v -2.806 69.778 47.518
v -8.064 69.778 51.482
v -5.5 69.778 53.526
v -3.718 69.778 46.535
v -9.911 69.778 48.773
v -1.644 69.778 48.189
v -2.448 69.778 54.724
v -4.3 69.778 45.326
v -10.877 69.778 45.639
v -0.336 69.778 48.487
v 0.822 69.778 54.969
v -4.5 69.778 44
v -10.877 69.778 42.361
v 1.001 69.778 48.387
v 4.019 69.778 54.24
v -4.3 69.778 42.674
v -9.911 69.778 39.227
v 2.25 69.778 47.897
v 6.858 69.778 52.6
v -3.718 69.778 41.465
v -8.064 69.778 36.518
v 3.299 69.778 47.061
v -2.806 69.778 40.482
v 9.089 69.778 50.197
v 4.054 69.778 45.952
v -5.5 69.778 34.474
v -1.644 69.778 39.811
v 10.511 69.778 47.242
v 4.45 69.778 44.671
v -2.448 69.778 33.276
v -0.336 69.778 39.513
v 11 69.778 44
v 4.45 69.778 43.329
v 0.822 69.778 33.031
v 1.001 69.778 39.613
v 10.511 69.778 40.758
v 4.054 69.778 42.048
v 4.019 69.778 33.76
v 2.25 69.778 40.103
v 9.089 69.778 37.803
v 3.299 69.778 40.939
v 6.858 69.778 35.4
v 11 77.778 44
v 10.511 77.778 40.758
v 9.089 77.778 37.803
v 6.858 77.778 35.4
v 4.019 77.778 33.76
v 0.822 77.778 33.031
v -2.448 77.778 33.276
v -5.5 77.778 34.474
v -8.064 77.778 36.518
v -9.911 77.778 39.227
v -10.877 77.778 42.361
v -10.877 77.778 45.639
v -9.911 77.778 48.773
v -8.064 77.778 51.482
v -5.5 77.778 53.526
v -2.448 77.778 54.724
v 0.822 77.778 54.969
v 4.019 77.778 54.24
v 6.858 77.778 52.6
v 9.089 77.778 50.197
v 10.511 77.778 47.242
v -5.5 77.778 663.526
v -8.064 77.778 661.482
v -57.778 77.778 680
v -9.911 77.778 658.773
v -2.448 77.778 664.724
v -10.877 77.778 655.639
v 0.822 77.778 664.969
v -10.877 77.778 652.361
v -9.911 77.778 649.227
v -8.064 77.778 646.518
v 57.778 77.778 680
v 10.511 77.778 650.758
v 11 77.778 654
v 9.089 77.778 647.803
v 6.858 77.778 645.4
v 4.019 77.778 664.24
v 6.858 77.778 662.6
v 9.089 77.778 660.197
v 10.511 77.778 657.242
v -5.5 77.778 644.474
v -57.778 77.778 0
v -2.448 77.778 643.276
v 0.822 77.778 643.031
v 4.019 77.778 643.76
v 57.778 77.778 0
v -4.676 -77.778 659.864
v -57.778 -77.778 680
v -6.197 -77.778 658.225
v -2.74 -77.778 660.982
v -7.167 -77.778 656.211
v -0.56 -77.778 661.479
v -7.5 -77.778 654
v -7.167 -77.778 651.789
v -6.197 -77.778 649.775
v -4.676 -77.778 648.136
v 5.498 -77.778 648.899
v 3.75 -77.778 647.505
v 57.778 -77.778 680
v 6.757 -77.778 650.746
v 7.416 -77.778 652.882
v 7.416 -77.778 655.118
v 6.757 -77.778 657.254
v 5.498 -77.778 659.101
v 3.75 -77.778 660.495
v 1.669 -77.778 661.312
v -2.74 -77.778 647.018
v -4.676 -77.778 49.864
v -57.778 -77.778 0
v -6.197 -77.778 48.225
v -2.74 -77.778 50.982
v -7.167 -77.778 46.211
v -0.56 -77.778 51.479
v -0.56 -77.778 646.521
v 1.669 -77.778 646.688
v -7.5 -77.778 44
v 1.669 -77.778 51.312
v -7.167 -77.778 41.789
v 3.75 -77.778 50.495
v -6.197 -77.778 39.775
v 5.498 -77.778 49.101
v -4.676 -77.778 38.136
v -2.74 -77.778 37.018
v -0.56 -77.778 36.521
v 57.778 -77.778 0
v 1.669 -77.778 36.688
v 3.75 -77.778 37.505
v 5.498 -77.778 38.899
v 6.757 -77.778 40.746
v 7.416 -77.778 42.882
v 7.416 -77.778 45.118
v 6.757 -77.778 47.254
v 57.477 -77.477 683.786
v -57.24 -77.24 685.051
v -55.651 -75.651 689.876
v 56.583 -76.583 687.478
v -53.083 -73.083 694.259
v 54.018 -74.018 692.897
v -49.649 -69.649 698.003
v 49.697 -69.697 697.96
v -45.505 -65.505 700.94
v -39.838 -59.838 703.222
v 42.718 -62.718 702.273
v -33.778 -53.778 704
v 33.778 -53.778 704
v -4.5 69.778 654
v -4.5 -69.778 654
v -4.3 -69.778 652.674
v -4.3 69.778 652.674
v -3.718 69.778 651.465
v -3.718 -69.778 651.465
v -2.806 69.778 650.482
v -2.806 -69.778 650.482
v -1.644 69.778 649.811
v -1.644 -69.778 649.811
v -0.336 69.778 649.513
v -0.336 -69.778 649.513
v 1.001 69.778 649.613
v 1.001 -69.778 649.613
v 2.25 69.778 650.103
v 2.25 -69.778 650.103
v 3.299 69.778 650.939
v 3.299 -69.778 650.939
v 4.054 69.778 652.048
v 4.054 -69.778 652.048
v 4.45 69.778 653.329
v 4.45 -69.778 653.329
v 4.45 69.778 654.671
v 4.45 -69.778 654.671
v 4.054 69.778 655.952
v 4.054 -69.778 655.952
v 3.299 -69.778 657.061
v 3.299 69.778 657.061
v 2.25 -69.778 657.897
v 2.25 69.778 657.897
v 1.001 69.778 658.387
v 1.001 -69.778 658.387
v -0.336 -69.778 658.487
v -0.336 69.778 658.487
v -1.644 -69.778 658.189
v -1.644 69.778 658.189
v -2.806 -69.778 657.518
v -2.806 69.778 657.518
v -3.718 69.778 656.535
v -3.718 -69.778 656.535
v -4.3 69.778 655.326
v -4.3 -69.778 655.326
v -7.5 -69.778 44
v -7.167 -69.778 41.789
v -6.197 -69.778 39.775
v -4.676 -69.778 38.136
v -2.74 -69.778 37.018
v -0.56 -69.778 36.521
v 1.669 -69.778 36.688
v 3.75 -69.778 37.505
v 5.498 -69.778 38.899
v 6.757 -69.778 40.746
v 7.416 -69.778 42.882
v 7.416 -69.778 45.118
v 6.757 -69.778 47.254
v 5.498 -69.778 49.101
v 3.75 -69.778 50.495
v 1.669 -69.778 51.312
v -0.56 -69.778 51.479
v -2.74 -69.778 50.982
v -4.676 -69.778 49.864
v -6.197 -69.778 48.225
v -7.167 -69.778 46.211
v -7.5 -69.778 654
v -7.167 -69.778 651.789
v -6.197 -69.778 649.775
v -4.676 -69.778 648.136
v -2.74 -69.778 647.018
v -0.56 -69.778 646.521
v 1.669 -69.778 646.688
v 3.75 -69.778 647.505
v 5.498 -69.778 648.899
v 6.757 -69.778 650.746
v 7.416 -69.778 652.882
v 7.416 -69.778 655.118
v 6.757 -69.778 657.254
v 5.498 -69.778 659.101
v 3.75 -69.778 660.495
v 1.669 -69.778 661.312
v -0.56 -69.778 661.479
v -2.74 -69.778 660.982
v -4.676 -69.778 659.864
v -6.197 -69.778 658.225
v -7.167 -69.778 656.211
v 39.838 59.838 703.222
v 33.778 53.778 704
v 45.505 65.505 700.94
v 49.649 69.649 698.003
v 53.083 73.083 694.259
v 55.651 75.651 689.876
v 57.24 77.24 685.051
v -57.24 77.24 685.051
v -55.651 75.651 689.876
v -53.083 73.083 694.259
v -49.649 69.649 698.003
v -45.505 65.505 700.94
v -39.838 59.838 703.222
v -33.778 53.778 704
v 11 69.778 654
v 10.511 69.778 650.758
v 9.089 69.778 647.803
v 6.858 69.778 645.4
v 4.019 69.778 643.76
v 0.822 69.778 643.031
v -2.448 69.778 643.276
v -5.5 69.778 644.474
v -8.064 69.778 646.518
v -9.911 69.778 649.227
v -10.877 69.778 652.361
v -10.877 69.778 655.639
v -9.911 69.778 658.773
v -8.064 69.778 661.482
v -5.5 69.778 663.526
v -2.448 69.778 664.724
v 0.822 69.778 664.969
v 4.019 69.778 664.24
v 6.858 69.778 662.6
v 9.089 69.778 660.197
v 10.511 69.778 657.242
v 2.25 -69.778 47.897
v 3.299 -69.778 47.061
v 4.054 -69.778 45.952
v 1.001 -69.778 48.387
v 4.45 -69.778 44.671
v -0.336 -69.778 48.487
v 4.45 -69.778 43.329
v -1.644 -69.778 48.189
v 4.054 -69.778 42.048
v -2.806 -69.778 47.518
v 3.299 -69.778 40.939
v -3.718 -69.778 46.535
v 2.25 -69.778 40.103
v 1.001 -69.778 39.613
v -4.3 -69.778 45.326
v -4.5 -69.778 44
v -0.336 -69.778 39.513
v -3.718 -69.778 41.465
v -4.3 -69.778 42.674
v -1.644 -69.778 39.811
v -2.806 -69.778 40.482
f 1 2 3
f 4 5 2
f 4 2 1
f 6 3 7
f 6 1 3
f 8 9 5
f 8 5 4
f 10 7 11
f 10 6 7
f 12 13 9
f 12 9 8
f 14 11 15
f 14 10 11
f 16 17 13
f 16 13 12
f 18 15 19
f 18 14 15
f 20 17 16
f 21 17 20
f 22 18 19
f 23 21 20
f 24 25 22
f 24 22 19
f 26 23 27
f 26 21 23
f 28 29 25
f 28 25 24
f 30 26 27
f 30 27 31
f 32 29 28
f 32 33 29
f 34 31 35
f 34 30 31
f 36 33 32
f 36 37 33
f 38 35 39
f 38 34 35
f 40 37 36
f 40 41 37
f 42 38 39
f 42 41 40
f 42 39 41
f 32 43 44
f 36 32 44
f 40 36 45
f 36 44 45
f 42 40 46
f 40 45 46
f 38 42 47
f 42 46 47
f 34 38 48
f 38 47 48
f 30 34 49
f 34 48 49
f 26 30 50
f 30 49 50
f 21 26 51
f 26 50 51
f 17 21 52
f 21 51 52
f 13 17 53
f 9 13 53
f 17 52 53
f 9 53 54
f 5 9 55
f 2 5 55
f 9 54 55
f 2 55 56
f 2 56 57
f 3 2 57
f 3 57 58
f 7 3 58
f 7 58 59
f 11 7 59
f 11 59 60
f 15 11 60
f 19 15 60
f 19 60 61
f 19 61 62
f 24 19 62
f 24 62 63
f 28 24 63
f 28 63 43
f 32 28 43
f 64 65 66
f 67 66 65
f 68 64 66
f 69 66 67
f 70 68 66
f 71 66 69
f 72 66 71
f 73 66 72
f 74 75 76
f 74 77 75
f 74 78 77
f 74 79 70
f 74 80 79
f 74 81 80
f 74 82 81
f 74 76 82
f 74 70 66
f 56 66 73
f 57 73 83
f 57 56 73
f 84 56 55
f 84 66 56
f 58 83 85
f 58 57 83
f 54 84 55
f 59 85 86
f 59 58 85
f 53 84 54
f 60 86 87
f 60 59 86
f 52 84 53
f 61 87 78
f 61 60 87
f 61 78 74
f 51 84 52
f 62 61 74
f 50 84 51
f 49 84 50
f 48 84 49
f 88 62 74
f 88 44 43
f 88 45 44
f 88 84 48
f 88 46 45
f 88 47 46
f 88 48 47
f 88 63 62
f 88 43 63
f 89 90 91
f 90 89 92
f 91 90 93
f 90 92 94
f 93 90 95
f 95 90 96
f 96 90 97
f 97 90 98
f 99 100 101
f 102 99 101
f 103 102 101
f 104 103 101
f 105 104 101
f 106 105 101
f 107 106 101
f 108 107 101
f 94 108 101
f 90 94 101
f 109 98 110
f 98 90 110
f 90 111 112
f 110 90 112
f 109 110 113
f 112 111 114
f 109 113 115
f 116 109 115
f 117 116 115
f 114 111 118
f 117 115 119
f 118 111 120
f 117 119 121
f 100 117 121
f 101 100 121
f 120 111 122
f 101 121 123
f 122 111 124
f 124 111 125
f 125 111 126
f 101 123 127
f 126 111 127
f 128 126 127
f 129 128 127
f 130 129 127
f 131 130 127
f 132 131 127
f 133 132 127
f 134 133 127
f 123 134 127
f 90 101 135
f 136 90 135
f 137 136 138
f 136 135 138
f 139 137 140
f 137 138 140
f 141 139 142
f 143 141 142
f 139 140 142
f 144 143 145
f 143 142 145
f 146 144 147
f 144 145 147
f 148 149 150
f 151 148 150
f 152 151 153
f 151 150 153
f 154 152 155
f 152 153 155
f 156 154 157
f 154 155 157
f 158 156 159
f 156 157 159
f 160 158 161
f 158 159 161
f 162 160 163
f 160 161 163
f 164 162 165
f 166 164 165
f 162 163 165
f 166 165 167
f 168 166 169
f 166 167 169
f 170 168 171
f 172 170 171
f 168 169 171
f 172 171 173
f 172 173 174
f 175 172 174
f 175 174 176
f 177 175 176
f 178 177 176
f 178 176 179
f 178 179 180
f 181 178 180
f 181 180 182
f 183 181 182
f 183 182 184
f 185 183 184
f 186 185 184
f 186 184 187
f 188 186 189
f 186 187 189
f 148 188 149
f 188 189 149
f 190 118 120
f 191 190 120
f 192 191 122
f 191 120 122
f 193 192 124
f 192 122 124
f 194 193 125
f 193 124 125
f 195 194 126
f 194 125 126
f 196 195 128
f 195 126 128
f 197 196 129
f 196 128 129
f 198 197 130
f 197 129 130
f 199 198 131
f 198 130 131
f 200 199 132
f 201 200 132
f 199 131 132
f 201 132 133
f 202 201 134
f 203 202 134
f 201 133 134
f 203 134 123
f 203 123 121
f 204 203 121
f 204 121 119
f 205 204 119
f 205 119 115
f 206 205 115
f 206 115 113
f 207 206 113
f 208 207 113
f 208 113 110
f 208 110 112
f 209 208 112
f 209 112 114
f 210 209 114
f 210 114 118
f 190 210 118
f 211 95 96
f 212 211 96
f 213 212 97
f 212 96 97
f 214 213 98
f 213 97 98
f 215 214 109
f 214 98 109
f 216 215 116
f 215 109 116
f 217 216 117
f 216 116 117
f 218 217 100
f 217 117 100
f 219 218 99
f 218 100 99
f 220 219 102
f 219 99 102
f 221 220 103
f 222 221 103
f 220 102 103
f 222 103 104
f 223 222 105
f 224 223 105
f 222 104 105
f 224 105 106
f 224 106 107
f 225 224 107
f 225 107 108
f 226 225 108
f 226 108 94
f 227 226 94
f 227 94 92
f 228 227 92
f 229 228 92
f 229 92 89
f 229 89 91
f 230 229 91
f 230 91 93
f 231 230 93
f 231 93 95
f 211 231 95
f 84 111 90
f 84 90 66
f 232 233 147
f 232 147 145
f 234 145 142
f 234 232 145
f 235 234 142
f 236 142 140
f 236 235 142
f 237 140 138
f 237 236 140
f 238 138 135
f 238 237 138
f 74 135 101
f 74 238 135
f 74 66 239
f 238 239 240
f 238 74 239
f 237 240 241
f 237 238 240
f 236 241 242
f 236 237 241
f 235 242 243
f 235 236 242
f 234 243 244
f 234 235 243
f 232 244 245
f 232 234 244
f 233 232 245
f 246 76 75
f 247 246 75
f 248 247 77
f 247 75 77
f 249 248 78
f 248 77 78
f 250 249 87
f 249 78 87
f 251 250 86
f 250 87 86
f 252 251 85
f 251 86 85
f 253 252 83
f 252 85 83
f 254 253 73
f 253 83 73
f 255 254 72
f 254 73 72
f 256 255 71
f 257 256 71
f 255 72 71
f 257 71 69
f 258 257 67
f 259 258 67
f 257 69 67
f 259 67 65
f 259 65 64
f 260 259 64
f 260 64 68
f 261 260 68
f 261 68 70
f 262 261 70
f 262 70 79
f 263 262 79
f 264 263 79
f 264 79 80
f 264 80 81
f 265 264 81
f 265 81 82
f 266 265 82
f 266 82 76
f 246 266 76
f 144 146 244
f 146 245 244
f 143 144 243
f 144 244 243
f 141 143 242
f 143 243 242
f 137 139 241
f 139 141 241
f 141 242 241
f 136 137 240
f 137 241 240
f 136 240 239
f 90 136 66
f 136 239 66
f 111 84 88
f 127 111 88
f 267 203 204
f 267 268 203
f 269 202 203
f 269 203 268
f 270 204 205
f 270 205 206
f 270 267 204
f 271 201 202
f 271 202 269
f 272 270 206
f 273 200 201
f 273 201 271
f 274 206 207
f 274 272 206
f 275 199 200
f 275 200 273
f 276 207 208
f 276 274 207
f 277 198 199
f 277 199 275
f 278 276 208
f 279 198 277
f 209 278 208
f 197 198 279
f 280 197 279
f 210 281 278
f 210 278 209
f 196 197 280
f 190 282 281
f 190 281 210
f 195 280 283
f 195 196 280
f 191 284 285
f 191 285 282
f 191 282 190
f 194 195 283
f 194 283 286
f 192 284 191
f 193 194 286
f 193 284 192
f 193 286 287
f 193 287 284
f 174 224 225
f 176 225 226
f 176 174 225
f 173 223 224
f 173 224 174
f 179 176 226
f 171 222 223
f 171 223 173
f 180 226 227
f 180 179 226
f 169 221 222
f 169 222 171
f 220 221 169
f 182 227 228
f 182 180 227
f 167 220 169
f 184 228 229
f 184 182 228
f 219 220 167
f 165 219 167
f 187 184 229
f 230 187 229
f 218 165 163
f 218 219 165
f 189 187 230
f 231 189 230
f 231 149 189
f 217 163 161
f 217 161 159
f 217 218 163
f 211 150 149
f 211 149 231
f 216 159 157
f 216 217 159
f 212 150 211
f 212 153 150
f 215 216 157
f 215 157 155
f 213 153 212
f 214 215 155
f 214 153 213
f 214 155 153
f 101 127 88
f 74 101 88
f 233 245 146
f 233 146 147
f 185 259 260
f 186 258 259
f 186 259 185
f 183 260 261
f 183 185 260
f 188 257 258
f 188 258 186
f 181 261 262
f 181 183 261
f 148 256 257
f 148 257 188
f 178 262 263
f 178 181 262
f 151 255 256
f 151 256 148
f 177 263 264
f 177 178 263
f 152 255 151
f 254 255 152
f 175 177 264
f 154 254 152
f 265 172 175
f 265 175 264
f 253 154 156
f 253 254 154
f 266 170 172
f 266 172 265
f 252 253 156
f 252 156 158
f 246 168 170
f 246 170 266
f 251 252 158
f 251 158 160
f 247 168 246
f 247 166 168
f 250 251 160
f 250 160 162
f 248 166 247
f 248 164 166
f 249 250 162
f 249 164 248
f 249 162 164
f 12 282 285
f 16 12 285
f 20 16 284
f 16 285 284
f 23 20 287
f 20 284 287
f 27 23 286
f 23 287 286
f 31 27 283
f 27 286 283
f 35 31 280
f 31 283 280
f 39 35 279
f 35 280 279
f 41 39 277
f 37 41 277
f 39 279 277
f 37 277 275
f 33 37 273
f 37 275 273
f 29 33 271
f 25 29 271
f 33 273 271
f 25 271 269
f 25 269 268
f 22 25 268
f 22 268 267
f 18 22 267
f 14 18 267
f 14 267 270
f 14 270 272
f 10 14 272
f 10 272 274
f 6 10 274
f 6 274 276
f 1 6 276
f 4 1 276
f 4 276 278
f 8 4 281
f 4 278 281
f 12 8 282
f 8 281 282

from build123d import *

# Parameters (mm, degrees)
SKIZZE1_W                                           = 115.555555556
SKIZZE1_H                                           = 155.555555556
AUFSATZ_LINEAR_AUSTRAGEN1_DEPTH                     = 704
SCHNITT_LINEAR_AUSTRAGEN1_DEPTH                     = 718.647872662
SCHNITT_LINEAR_AUSTRAGEN2_DEPTH                     = 724.292335414
SPIEGELN2_COPY_1_DEPTH                              = 718.647872662
SPIEGELN2_COPY_2_DEPTH                              = 718.647872662
STIRNSENKUNG_F_R_M8_SENKSCHRAUBE_KOPF_B_D           = 9
STIRNSENKUNG_F_R_M8_SENKSCHRAUBE_KOPF_B_CBORE_D     = 22
STIRNSENKUNG_F_R_M8_SENKSCHRAUBE_KOPF_B_CBORE_DEPTH = 8
STIRNSENKUNG_F_R_M8_SENKSCHRAUBE_KO_2_D             = 9
STIRNSENKUNG_F_R_M8_SENKSCHRAUBE_KO_2_CBORE_D       = 15
STIRNSENKUNG_F_R_M8_SENKSCHRAUBE_KO_2_CBORE_DEPTH   = 8


with BuildPart() as part:
    # Skizze1 → Aufsatz-Linear austragen1 (new body)
    with BuildSketch(Plane.XY):
        Rectangle(SKIZZE1_W, SKIZZE1_H)
    extrude(amount=AUFSATZ_LINEAR_AUSTRAGEN1_DEPTH)

    # Skizze2 → Schnitt-Linear austragen1 (cut, through all)
    with BuildSketch(Plane(origin=(57.777777778, 0, 0), x_dir=(0, 0, -1), z_dir=(1, 0, 0))):
        with BuildLine():
            Line((-704, 53.777777778), (-704, 77.777777778))
            Line((-704, 77.777777778), (-680, 77.777777778))
            ThreePointArc((-680, 77.777777778), (-696.970562748, 70.748340526), (-704, 53.777777778))
        make_face()
    schnitt_linear_austragen1 = extrude(amount=-SCHNITT_LINEAR_AUSTRAGEN1_DEPTH, mode=Mode.SUBTRACT)

    # Skizze3 → Schnitt-Linear austragen2 (cut, through all)
    with BuildSketch(Plane(origin=(0, 77.777777778, 0), x_dir=(1, 0, 0), z_dir=(0, 1, 0))):
        with BuildLine():
            Line((-57.777777778, -680), (-57.777777778, -704))
            Line((-57.777777778, -704), (-33.777777778, -704))
            ThreePointArc((-33.777777778, -704), (-50.748340526, -696.970562748), (-57.777777778, -680))
        make_face()
    schnitt_linear_austragen2 = extrude(amount=-SCHNITT_LINEAR_AUSTRAGEN2_DEPTH, mode=Mode.SUBTRACT)

    # Spiegeln1: Schnitt-Linear austragen1 across plane
    add(schnitt_linear_austragen1.mirror(Plane.ZX), mode=Mode.SUBTRACT)

    # Spiegeln2: Schnitt-Linear austragen2 across plane
    add(schnitt_linear_austragen2.mirror(Plane(origin=(0, 0, 0), x_dir=(0, 0, 1), z_dir=(1, 0, 0))), mode=Mode.SUBTRACT)

    # Spiegeln2 copy 1 sketch → Spiegeln2 copy 1 (cut, through all)
    with BuildSketch(Plane(origin=(-57.777777778, 0, 0), x_dir=(0, 0, -1), z_dir=(-1, 0, 0))):
        with BuildLine():
            Line((-704, 53.777777778), (-704, 77.777777778))
            Line((-704, 77.777777778), (-680, 77.777777778))
            ThreePointArc((-680, 77.777777778), (-696.970562748, 70.748340526), (-704, 53.777777778))
        make_face()
    extrude(amount=-SPIEGELN2_COPY_1_DEPTH, mode=Mode.SUBTRACT)

    # Spiegeln2 copy 2 sketch → Spiegeln2 copy 2 (cut, through all)
    with BuildSketch(Plane(origin=(-57.777777778, 0, 0), x_dir=(0, 0, -1), z_dir=(-1, 0, 0))):
        with BuildLine():
            Line((-704, -53.777777778), (-704, -77.777777778))
            Line((-704, -77.777777778), (-680, -77.777777778))
            ThreePointArc((-680, -77.777777778), (-696.970562748, -70.748340526), (-704, -53.777777778))
        make_face()
    extrude(amount=-SPIEGELN2_COPY_2_DEPTH, mode=Mode.SUBTRACT)

    # Stirnsenkung f_r M8 Senkschraube _Kopf B (through all)
    with Locations(Plane(origin=(0, 77.777777778, 0), x_dir=(1, 0, 0), z_dir=(0, 1, 0))):
        with Locations((0, -654), (0, -44)):
            CounterBoreHole(STIRNSENKUNG_F_R_M8_SENKSCHRAUBE_KOPF_B_D / 2, STIRNSENKUNG_F_R_M8_SENKSCHRAUBE_KOPF_B_CBORE_D / 2, STIRNSENKUNG_F_R_M8_SENKSCHRAUBE_KOPF_B_CBORE_DEPTH)

    # Stirnsenkung f_r M8 Senkschraube _Ko 2 (through all)
    with Locations(Plane(origin=(0, -77.777777778, 0), x_dir=(-1, 0, 0), z_dir=(0, -1, 0))):
        with Locations((0, -654), (0, -44)):
            CounterBoreHole(STIRNSENKUNG_F_R_M8_SENKSCHRAUBE_KO_2_D / 2, STIRNSENKUNG_F_R_M8_SENKSCHRAUBE_KO_2_CBORE_D / 2, STIRNSENKUNG_F_R_M8_SENKSCHRAUBE_KO_2_CBORE_DEPTH)


solid = part.part
